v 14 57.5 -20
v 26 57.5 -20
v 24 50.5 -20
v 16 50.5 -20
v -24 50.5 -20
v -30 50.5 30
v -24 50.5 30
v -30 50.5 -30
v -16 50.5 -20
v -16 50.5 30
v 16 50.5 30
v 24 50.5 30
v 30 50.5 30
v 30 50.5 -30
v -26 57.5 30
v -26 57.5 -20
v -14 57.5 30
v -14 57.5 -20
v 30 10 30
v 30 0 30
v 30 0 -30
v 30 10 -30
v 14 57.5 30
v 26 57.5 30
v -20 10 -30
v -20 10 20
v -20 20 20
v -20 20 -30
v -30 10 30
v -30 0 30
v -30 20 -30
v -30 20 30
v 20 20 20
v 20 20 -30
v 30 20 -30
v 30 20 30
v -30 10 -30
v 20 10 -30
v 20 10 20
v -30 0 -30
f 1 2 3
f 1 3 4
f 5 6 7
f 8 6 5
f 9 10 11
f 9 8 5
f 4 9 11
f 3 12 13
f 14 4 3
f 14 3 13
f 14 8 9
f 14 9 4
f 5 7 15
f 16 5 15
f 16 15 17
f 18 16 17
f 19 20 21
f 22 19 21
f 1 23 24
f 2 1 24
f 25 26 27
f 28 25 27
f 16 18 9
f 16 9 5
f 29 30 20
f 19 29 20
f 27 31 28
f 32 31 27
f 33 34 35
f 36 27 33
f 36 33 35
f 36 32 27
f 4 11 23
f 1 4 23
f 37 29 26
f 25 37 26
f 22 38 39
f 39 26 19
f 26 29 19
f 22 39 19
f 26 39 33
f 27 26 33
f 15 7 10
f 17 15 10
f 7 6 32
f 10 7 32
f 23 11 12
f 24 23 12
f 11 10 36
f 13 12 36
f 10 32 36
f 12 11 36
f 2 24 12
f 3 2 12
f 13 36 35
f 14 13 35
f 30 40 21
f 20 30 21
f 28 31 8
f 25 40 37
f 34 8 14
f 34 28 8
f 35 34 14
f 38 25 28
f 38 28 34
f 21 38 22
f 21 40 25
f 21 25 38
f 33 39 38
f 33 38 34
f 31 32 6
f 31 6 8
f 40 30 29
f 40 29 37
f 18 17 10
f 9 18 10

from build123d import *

# Parameters (mm, degrees)
CROQUIS2_W              = 60
CROQUIS2_H              = 60
SALIENTE_EXTRUIR1_DEPTH = 50.5
SALIENTE_EXTRUIR3_DEPTH = 50
MATRIZL2_COUNT          = 2
MATRIZL2_PITCH          = 40
CROQUIS5_W              = 10
CROQUIS5_H              = 10
CORTAR_EXTRUIR1_DEPTH   = 89.352985235
MATRIZL3_COUNT          = 2
MATRIZL3_PITCH          = 50
MATRIZC1_COUNT          = 2
MATRIZC1_ANGLE          = 90


with BuildPart() as part:
    # Croquis2 → Saliente-Extruir1 (new body)
    with BuildSketch(Plane(origin=(0, 0, 0), x_dir=(1, 0, 0), z_dir=(0, 1, 0))):
        Rectangle(CROQUIS2_W, CROQUIS2_H)
    extrude(amount=SALIENTE_EXTRUIR1_DEPTH)

    # Croquis4 → Saliente-Extruir3 (add)
    with BuildSketch(Plane.XY.offset(30)):
        Polygon((-26, 57.5), (-14, 57.5), (-16, 50.5), (-24, 50.5), align=None)
    saliente_extruir3 = extrude(amount=-SALIENTE_EXTRUIR3_DEPTH)

    # MatrizL2: Saliente-Extruir3 ×2
    with Locations(*[(i * MATRIZL2_PITCH, 0, 0) for i in range(1, MATRIZL2_COUNT)]):
        add(saliente_extruir3)

    # Croquis5 → Cortar-Extruir1 (cut, through all)
    with BuildSketch(Plane.XY.offset(30)):
        with Locations((-25, 15)):
            Rectangle(CROQUIS5_W, CROQUIS5_H)
    cortar_extruir1 = extrude(amount=-CORTAR_EXTRUIR1_DEPTH, mode=Mode.SUBTRACT)

    # MatrizL3: Cortar-Extruir1 ×2
    with Locations(*[(i * MATRIZL3_PITCH, 0, 0) for i in range(1, MATRIZL3_COUNT)]):
        add(cortar_extruir1, mode=Mode.SUBTRACT)

    # MatrizC1: Cortar-Extruir1 ×2 about axis
    matrizc1_axis = Axis((0, 0, 0), (0, 1, 0))
    for i in range(1, MATRIZC1_COUNT):
        add(cortar_extruir1.rotate(matrizc1_axis, i * MATRIZC1_ANGLE / (MATRIZC1_COUNT - 1)), mode=Mode.SUBTRACT)


solid = part.part
